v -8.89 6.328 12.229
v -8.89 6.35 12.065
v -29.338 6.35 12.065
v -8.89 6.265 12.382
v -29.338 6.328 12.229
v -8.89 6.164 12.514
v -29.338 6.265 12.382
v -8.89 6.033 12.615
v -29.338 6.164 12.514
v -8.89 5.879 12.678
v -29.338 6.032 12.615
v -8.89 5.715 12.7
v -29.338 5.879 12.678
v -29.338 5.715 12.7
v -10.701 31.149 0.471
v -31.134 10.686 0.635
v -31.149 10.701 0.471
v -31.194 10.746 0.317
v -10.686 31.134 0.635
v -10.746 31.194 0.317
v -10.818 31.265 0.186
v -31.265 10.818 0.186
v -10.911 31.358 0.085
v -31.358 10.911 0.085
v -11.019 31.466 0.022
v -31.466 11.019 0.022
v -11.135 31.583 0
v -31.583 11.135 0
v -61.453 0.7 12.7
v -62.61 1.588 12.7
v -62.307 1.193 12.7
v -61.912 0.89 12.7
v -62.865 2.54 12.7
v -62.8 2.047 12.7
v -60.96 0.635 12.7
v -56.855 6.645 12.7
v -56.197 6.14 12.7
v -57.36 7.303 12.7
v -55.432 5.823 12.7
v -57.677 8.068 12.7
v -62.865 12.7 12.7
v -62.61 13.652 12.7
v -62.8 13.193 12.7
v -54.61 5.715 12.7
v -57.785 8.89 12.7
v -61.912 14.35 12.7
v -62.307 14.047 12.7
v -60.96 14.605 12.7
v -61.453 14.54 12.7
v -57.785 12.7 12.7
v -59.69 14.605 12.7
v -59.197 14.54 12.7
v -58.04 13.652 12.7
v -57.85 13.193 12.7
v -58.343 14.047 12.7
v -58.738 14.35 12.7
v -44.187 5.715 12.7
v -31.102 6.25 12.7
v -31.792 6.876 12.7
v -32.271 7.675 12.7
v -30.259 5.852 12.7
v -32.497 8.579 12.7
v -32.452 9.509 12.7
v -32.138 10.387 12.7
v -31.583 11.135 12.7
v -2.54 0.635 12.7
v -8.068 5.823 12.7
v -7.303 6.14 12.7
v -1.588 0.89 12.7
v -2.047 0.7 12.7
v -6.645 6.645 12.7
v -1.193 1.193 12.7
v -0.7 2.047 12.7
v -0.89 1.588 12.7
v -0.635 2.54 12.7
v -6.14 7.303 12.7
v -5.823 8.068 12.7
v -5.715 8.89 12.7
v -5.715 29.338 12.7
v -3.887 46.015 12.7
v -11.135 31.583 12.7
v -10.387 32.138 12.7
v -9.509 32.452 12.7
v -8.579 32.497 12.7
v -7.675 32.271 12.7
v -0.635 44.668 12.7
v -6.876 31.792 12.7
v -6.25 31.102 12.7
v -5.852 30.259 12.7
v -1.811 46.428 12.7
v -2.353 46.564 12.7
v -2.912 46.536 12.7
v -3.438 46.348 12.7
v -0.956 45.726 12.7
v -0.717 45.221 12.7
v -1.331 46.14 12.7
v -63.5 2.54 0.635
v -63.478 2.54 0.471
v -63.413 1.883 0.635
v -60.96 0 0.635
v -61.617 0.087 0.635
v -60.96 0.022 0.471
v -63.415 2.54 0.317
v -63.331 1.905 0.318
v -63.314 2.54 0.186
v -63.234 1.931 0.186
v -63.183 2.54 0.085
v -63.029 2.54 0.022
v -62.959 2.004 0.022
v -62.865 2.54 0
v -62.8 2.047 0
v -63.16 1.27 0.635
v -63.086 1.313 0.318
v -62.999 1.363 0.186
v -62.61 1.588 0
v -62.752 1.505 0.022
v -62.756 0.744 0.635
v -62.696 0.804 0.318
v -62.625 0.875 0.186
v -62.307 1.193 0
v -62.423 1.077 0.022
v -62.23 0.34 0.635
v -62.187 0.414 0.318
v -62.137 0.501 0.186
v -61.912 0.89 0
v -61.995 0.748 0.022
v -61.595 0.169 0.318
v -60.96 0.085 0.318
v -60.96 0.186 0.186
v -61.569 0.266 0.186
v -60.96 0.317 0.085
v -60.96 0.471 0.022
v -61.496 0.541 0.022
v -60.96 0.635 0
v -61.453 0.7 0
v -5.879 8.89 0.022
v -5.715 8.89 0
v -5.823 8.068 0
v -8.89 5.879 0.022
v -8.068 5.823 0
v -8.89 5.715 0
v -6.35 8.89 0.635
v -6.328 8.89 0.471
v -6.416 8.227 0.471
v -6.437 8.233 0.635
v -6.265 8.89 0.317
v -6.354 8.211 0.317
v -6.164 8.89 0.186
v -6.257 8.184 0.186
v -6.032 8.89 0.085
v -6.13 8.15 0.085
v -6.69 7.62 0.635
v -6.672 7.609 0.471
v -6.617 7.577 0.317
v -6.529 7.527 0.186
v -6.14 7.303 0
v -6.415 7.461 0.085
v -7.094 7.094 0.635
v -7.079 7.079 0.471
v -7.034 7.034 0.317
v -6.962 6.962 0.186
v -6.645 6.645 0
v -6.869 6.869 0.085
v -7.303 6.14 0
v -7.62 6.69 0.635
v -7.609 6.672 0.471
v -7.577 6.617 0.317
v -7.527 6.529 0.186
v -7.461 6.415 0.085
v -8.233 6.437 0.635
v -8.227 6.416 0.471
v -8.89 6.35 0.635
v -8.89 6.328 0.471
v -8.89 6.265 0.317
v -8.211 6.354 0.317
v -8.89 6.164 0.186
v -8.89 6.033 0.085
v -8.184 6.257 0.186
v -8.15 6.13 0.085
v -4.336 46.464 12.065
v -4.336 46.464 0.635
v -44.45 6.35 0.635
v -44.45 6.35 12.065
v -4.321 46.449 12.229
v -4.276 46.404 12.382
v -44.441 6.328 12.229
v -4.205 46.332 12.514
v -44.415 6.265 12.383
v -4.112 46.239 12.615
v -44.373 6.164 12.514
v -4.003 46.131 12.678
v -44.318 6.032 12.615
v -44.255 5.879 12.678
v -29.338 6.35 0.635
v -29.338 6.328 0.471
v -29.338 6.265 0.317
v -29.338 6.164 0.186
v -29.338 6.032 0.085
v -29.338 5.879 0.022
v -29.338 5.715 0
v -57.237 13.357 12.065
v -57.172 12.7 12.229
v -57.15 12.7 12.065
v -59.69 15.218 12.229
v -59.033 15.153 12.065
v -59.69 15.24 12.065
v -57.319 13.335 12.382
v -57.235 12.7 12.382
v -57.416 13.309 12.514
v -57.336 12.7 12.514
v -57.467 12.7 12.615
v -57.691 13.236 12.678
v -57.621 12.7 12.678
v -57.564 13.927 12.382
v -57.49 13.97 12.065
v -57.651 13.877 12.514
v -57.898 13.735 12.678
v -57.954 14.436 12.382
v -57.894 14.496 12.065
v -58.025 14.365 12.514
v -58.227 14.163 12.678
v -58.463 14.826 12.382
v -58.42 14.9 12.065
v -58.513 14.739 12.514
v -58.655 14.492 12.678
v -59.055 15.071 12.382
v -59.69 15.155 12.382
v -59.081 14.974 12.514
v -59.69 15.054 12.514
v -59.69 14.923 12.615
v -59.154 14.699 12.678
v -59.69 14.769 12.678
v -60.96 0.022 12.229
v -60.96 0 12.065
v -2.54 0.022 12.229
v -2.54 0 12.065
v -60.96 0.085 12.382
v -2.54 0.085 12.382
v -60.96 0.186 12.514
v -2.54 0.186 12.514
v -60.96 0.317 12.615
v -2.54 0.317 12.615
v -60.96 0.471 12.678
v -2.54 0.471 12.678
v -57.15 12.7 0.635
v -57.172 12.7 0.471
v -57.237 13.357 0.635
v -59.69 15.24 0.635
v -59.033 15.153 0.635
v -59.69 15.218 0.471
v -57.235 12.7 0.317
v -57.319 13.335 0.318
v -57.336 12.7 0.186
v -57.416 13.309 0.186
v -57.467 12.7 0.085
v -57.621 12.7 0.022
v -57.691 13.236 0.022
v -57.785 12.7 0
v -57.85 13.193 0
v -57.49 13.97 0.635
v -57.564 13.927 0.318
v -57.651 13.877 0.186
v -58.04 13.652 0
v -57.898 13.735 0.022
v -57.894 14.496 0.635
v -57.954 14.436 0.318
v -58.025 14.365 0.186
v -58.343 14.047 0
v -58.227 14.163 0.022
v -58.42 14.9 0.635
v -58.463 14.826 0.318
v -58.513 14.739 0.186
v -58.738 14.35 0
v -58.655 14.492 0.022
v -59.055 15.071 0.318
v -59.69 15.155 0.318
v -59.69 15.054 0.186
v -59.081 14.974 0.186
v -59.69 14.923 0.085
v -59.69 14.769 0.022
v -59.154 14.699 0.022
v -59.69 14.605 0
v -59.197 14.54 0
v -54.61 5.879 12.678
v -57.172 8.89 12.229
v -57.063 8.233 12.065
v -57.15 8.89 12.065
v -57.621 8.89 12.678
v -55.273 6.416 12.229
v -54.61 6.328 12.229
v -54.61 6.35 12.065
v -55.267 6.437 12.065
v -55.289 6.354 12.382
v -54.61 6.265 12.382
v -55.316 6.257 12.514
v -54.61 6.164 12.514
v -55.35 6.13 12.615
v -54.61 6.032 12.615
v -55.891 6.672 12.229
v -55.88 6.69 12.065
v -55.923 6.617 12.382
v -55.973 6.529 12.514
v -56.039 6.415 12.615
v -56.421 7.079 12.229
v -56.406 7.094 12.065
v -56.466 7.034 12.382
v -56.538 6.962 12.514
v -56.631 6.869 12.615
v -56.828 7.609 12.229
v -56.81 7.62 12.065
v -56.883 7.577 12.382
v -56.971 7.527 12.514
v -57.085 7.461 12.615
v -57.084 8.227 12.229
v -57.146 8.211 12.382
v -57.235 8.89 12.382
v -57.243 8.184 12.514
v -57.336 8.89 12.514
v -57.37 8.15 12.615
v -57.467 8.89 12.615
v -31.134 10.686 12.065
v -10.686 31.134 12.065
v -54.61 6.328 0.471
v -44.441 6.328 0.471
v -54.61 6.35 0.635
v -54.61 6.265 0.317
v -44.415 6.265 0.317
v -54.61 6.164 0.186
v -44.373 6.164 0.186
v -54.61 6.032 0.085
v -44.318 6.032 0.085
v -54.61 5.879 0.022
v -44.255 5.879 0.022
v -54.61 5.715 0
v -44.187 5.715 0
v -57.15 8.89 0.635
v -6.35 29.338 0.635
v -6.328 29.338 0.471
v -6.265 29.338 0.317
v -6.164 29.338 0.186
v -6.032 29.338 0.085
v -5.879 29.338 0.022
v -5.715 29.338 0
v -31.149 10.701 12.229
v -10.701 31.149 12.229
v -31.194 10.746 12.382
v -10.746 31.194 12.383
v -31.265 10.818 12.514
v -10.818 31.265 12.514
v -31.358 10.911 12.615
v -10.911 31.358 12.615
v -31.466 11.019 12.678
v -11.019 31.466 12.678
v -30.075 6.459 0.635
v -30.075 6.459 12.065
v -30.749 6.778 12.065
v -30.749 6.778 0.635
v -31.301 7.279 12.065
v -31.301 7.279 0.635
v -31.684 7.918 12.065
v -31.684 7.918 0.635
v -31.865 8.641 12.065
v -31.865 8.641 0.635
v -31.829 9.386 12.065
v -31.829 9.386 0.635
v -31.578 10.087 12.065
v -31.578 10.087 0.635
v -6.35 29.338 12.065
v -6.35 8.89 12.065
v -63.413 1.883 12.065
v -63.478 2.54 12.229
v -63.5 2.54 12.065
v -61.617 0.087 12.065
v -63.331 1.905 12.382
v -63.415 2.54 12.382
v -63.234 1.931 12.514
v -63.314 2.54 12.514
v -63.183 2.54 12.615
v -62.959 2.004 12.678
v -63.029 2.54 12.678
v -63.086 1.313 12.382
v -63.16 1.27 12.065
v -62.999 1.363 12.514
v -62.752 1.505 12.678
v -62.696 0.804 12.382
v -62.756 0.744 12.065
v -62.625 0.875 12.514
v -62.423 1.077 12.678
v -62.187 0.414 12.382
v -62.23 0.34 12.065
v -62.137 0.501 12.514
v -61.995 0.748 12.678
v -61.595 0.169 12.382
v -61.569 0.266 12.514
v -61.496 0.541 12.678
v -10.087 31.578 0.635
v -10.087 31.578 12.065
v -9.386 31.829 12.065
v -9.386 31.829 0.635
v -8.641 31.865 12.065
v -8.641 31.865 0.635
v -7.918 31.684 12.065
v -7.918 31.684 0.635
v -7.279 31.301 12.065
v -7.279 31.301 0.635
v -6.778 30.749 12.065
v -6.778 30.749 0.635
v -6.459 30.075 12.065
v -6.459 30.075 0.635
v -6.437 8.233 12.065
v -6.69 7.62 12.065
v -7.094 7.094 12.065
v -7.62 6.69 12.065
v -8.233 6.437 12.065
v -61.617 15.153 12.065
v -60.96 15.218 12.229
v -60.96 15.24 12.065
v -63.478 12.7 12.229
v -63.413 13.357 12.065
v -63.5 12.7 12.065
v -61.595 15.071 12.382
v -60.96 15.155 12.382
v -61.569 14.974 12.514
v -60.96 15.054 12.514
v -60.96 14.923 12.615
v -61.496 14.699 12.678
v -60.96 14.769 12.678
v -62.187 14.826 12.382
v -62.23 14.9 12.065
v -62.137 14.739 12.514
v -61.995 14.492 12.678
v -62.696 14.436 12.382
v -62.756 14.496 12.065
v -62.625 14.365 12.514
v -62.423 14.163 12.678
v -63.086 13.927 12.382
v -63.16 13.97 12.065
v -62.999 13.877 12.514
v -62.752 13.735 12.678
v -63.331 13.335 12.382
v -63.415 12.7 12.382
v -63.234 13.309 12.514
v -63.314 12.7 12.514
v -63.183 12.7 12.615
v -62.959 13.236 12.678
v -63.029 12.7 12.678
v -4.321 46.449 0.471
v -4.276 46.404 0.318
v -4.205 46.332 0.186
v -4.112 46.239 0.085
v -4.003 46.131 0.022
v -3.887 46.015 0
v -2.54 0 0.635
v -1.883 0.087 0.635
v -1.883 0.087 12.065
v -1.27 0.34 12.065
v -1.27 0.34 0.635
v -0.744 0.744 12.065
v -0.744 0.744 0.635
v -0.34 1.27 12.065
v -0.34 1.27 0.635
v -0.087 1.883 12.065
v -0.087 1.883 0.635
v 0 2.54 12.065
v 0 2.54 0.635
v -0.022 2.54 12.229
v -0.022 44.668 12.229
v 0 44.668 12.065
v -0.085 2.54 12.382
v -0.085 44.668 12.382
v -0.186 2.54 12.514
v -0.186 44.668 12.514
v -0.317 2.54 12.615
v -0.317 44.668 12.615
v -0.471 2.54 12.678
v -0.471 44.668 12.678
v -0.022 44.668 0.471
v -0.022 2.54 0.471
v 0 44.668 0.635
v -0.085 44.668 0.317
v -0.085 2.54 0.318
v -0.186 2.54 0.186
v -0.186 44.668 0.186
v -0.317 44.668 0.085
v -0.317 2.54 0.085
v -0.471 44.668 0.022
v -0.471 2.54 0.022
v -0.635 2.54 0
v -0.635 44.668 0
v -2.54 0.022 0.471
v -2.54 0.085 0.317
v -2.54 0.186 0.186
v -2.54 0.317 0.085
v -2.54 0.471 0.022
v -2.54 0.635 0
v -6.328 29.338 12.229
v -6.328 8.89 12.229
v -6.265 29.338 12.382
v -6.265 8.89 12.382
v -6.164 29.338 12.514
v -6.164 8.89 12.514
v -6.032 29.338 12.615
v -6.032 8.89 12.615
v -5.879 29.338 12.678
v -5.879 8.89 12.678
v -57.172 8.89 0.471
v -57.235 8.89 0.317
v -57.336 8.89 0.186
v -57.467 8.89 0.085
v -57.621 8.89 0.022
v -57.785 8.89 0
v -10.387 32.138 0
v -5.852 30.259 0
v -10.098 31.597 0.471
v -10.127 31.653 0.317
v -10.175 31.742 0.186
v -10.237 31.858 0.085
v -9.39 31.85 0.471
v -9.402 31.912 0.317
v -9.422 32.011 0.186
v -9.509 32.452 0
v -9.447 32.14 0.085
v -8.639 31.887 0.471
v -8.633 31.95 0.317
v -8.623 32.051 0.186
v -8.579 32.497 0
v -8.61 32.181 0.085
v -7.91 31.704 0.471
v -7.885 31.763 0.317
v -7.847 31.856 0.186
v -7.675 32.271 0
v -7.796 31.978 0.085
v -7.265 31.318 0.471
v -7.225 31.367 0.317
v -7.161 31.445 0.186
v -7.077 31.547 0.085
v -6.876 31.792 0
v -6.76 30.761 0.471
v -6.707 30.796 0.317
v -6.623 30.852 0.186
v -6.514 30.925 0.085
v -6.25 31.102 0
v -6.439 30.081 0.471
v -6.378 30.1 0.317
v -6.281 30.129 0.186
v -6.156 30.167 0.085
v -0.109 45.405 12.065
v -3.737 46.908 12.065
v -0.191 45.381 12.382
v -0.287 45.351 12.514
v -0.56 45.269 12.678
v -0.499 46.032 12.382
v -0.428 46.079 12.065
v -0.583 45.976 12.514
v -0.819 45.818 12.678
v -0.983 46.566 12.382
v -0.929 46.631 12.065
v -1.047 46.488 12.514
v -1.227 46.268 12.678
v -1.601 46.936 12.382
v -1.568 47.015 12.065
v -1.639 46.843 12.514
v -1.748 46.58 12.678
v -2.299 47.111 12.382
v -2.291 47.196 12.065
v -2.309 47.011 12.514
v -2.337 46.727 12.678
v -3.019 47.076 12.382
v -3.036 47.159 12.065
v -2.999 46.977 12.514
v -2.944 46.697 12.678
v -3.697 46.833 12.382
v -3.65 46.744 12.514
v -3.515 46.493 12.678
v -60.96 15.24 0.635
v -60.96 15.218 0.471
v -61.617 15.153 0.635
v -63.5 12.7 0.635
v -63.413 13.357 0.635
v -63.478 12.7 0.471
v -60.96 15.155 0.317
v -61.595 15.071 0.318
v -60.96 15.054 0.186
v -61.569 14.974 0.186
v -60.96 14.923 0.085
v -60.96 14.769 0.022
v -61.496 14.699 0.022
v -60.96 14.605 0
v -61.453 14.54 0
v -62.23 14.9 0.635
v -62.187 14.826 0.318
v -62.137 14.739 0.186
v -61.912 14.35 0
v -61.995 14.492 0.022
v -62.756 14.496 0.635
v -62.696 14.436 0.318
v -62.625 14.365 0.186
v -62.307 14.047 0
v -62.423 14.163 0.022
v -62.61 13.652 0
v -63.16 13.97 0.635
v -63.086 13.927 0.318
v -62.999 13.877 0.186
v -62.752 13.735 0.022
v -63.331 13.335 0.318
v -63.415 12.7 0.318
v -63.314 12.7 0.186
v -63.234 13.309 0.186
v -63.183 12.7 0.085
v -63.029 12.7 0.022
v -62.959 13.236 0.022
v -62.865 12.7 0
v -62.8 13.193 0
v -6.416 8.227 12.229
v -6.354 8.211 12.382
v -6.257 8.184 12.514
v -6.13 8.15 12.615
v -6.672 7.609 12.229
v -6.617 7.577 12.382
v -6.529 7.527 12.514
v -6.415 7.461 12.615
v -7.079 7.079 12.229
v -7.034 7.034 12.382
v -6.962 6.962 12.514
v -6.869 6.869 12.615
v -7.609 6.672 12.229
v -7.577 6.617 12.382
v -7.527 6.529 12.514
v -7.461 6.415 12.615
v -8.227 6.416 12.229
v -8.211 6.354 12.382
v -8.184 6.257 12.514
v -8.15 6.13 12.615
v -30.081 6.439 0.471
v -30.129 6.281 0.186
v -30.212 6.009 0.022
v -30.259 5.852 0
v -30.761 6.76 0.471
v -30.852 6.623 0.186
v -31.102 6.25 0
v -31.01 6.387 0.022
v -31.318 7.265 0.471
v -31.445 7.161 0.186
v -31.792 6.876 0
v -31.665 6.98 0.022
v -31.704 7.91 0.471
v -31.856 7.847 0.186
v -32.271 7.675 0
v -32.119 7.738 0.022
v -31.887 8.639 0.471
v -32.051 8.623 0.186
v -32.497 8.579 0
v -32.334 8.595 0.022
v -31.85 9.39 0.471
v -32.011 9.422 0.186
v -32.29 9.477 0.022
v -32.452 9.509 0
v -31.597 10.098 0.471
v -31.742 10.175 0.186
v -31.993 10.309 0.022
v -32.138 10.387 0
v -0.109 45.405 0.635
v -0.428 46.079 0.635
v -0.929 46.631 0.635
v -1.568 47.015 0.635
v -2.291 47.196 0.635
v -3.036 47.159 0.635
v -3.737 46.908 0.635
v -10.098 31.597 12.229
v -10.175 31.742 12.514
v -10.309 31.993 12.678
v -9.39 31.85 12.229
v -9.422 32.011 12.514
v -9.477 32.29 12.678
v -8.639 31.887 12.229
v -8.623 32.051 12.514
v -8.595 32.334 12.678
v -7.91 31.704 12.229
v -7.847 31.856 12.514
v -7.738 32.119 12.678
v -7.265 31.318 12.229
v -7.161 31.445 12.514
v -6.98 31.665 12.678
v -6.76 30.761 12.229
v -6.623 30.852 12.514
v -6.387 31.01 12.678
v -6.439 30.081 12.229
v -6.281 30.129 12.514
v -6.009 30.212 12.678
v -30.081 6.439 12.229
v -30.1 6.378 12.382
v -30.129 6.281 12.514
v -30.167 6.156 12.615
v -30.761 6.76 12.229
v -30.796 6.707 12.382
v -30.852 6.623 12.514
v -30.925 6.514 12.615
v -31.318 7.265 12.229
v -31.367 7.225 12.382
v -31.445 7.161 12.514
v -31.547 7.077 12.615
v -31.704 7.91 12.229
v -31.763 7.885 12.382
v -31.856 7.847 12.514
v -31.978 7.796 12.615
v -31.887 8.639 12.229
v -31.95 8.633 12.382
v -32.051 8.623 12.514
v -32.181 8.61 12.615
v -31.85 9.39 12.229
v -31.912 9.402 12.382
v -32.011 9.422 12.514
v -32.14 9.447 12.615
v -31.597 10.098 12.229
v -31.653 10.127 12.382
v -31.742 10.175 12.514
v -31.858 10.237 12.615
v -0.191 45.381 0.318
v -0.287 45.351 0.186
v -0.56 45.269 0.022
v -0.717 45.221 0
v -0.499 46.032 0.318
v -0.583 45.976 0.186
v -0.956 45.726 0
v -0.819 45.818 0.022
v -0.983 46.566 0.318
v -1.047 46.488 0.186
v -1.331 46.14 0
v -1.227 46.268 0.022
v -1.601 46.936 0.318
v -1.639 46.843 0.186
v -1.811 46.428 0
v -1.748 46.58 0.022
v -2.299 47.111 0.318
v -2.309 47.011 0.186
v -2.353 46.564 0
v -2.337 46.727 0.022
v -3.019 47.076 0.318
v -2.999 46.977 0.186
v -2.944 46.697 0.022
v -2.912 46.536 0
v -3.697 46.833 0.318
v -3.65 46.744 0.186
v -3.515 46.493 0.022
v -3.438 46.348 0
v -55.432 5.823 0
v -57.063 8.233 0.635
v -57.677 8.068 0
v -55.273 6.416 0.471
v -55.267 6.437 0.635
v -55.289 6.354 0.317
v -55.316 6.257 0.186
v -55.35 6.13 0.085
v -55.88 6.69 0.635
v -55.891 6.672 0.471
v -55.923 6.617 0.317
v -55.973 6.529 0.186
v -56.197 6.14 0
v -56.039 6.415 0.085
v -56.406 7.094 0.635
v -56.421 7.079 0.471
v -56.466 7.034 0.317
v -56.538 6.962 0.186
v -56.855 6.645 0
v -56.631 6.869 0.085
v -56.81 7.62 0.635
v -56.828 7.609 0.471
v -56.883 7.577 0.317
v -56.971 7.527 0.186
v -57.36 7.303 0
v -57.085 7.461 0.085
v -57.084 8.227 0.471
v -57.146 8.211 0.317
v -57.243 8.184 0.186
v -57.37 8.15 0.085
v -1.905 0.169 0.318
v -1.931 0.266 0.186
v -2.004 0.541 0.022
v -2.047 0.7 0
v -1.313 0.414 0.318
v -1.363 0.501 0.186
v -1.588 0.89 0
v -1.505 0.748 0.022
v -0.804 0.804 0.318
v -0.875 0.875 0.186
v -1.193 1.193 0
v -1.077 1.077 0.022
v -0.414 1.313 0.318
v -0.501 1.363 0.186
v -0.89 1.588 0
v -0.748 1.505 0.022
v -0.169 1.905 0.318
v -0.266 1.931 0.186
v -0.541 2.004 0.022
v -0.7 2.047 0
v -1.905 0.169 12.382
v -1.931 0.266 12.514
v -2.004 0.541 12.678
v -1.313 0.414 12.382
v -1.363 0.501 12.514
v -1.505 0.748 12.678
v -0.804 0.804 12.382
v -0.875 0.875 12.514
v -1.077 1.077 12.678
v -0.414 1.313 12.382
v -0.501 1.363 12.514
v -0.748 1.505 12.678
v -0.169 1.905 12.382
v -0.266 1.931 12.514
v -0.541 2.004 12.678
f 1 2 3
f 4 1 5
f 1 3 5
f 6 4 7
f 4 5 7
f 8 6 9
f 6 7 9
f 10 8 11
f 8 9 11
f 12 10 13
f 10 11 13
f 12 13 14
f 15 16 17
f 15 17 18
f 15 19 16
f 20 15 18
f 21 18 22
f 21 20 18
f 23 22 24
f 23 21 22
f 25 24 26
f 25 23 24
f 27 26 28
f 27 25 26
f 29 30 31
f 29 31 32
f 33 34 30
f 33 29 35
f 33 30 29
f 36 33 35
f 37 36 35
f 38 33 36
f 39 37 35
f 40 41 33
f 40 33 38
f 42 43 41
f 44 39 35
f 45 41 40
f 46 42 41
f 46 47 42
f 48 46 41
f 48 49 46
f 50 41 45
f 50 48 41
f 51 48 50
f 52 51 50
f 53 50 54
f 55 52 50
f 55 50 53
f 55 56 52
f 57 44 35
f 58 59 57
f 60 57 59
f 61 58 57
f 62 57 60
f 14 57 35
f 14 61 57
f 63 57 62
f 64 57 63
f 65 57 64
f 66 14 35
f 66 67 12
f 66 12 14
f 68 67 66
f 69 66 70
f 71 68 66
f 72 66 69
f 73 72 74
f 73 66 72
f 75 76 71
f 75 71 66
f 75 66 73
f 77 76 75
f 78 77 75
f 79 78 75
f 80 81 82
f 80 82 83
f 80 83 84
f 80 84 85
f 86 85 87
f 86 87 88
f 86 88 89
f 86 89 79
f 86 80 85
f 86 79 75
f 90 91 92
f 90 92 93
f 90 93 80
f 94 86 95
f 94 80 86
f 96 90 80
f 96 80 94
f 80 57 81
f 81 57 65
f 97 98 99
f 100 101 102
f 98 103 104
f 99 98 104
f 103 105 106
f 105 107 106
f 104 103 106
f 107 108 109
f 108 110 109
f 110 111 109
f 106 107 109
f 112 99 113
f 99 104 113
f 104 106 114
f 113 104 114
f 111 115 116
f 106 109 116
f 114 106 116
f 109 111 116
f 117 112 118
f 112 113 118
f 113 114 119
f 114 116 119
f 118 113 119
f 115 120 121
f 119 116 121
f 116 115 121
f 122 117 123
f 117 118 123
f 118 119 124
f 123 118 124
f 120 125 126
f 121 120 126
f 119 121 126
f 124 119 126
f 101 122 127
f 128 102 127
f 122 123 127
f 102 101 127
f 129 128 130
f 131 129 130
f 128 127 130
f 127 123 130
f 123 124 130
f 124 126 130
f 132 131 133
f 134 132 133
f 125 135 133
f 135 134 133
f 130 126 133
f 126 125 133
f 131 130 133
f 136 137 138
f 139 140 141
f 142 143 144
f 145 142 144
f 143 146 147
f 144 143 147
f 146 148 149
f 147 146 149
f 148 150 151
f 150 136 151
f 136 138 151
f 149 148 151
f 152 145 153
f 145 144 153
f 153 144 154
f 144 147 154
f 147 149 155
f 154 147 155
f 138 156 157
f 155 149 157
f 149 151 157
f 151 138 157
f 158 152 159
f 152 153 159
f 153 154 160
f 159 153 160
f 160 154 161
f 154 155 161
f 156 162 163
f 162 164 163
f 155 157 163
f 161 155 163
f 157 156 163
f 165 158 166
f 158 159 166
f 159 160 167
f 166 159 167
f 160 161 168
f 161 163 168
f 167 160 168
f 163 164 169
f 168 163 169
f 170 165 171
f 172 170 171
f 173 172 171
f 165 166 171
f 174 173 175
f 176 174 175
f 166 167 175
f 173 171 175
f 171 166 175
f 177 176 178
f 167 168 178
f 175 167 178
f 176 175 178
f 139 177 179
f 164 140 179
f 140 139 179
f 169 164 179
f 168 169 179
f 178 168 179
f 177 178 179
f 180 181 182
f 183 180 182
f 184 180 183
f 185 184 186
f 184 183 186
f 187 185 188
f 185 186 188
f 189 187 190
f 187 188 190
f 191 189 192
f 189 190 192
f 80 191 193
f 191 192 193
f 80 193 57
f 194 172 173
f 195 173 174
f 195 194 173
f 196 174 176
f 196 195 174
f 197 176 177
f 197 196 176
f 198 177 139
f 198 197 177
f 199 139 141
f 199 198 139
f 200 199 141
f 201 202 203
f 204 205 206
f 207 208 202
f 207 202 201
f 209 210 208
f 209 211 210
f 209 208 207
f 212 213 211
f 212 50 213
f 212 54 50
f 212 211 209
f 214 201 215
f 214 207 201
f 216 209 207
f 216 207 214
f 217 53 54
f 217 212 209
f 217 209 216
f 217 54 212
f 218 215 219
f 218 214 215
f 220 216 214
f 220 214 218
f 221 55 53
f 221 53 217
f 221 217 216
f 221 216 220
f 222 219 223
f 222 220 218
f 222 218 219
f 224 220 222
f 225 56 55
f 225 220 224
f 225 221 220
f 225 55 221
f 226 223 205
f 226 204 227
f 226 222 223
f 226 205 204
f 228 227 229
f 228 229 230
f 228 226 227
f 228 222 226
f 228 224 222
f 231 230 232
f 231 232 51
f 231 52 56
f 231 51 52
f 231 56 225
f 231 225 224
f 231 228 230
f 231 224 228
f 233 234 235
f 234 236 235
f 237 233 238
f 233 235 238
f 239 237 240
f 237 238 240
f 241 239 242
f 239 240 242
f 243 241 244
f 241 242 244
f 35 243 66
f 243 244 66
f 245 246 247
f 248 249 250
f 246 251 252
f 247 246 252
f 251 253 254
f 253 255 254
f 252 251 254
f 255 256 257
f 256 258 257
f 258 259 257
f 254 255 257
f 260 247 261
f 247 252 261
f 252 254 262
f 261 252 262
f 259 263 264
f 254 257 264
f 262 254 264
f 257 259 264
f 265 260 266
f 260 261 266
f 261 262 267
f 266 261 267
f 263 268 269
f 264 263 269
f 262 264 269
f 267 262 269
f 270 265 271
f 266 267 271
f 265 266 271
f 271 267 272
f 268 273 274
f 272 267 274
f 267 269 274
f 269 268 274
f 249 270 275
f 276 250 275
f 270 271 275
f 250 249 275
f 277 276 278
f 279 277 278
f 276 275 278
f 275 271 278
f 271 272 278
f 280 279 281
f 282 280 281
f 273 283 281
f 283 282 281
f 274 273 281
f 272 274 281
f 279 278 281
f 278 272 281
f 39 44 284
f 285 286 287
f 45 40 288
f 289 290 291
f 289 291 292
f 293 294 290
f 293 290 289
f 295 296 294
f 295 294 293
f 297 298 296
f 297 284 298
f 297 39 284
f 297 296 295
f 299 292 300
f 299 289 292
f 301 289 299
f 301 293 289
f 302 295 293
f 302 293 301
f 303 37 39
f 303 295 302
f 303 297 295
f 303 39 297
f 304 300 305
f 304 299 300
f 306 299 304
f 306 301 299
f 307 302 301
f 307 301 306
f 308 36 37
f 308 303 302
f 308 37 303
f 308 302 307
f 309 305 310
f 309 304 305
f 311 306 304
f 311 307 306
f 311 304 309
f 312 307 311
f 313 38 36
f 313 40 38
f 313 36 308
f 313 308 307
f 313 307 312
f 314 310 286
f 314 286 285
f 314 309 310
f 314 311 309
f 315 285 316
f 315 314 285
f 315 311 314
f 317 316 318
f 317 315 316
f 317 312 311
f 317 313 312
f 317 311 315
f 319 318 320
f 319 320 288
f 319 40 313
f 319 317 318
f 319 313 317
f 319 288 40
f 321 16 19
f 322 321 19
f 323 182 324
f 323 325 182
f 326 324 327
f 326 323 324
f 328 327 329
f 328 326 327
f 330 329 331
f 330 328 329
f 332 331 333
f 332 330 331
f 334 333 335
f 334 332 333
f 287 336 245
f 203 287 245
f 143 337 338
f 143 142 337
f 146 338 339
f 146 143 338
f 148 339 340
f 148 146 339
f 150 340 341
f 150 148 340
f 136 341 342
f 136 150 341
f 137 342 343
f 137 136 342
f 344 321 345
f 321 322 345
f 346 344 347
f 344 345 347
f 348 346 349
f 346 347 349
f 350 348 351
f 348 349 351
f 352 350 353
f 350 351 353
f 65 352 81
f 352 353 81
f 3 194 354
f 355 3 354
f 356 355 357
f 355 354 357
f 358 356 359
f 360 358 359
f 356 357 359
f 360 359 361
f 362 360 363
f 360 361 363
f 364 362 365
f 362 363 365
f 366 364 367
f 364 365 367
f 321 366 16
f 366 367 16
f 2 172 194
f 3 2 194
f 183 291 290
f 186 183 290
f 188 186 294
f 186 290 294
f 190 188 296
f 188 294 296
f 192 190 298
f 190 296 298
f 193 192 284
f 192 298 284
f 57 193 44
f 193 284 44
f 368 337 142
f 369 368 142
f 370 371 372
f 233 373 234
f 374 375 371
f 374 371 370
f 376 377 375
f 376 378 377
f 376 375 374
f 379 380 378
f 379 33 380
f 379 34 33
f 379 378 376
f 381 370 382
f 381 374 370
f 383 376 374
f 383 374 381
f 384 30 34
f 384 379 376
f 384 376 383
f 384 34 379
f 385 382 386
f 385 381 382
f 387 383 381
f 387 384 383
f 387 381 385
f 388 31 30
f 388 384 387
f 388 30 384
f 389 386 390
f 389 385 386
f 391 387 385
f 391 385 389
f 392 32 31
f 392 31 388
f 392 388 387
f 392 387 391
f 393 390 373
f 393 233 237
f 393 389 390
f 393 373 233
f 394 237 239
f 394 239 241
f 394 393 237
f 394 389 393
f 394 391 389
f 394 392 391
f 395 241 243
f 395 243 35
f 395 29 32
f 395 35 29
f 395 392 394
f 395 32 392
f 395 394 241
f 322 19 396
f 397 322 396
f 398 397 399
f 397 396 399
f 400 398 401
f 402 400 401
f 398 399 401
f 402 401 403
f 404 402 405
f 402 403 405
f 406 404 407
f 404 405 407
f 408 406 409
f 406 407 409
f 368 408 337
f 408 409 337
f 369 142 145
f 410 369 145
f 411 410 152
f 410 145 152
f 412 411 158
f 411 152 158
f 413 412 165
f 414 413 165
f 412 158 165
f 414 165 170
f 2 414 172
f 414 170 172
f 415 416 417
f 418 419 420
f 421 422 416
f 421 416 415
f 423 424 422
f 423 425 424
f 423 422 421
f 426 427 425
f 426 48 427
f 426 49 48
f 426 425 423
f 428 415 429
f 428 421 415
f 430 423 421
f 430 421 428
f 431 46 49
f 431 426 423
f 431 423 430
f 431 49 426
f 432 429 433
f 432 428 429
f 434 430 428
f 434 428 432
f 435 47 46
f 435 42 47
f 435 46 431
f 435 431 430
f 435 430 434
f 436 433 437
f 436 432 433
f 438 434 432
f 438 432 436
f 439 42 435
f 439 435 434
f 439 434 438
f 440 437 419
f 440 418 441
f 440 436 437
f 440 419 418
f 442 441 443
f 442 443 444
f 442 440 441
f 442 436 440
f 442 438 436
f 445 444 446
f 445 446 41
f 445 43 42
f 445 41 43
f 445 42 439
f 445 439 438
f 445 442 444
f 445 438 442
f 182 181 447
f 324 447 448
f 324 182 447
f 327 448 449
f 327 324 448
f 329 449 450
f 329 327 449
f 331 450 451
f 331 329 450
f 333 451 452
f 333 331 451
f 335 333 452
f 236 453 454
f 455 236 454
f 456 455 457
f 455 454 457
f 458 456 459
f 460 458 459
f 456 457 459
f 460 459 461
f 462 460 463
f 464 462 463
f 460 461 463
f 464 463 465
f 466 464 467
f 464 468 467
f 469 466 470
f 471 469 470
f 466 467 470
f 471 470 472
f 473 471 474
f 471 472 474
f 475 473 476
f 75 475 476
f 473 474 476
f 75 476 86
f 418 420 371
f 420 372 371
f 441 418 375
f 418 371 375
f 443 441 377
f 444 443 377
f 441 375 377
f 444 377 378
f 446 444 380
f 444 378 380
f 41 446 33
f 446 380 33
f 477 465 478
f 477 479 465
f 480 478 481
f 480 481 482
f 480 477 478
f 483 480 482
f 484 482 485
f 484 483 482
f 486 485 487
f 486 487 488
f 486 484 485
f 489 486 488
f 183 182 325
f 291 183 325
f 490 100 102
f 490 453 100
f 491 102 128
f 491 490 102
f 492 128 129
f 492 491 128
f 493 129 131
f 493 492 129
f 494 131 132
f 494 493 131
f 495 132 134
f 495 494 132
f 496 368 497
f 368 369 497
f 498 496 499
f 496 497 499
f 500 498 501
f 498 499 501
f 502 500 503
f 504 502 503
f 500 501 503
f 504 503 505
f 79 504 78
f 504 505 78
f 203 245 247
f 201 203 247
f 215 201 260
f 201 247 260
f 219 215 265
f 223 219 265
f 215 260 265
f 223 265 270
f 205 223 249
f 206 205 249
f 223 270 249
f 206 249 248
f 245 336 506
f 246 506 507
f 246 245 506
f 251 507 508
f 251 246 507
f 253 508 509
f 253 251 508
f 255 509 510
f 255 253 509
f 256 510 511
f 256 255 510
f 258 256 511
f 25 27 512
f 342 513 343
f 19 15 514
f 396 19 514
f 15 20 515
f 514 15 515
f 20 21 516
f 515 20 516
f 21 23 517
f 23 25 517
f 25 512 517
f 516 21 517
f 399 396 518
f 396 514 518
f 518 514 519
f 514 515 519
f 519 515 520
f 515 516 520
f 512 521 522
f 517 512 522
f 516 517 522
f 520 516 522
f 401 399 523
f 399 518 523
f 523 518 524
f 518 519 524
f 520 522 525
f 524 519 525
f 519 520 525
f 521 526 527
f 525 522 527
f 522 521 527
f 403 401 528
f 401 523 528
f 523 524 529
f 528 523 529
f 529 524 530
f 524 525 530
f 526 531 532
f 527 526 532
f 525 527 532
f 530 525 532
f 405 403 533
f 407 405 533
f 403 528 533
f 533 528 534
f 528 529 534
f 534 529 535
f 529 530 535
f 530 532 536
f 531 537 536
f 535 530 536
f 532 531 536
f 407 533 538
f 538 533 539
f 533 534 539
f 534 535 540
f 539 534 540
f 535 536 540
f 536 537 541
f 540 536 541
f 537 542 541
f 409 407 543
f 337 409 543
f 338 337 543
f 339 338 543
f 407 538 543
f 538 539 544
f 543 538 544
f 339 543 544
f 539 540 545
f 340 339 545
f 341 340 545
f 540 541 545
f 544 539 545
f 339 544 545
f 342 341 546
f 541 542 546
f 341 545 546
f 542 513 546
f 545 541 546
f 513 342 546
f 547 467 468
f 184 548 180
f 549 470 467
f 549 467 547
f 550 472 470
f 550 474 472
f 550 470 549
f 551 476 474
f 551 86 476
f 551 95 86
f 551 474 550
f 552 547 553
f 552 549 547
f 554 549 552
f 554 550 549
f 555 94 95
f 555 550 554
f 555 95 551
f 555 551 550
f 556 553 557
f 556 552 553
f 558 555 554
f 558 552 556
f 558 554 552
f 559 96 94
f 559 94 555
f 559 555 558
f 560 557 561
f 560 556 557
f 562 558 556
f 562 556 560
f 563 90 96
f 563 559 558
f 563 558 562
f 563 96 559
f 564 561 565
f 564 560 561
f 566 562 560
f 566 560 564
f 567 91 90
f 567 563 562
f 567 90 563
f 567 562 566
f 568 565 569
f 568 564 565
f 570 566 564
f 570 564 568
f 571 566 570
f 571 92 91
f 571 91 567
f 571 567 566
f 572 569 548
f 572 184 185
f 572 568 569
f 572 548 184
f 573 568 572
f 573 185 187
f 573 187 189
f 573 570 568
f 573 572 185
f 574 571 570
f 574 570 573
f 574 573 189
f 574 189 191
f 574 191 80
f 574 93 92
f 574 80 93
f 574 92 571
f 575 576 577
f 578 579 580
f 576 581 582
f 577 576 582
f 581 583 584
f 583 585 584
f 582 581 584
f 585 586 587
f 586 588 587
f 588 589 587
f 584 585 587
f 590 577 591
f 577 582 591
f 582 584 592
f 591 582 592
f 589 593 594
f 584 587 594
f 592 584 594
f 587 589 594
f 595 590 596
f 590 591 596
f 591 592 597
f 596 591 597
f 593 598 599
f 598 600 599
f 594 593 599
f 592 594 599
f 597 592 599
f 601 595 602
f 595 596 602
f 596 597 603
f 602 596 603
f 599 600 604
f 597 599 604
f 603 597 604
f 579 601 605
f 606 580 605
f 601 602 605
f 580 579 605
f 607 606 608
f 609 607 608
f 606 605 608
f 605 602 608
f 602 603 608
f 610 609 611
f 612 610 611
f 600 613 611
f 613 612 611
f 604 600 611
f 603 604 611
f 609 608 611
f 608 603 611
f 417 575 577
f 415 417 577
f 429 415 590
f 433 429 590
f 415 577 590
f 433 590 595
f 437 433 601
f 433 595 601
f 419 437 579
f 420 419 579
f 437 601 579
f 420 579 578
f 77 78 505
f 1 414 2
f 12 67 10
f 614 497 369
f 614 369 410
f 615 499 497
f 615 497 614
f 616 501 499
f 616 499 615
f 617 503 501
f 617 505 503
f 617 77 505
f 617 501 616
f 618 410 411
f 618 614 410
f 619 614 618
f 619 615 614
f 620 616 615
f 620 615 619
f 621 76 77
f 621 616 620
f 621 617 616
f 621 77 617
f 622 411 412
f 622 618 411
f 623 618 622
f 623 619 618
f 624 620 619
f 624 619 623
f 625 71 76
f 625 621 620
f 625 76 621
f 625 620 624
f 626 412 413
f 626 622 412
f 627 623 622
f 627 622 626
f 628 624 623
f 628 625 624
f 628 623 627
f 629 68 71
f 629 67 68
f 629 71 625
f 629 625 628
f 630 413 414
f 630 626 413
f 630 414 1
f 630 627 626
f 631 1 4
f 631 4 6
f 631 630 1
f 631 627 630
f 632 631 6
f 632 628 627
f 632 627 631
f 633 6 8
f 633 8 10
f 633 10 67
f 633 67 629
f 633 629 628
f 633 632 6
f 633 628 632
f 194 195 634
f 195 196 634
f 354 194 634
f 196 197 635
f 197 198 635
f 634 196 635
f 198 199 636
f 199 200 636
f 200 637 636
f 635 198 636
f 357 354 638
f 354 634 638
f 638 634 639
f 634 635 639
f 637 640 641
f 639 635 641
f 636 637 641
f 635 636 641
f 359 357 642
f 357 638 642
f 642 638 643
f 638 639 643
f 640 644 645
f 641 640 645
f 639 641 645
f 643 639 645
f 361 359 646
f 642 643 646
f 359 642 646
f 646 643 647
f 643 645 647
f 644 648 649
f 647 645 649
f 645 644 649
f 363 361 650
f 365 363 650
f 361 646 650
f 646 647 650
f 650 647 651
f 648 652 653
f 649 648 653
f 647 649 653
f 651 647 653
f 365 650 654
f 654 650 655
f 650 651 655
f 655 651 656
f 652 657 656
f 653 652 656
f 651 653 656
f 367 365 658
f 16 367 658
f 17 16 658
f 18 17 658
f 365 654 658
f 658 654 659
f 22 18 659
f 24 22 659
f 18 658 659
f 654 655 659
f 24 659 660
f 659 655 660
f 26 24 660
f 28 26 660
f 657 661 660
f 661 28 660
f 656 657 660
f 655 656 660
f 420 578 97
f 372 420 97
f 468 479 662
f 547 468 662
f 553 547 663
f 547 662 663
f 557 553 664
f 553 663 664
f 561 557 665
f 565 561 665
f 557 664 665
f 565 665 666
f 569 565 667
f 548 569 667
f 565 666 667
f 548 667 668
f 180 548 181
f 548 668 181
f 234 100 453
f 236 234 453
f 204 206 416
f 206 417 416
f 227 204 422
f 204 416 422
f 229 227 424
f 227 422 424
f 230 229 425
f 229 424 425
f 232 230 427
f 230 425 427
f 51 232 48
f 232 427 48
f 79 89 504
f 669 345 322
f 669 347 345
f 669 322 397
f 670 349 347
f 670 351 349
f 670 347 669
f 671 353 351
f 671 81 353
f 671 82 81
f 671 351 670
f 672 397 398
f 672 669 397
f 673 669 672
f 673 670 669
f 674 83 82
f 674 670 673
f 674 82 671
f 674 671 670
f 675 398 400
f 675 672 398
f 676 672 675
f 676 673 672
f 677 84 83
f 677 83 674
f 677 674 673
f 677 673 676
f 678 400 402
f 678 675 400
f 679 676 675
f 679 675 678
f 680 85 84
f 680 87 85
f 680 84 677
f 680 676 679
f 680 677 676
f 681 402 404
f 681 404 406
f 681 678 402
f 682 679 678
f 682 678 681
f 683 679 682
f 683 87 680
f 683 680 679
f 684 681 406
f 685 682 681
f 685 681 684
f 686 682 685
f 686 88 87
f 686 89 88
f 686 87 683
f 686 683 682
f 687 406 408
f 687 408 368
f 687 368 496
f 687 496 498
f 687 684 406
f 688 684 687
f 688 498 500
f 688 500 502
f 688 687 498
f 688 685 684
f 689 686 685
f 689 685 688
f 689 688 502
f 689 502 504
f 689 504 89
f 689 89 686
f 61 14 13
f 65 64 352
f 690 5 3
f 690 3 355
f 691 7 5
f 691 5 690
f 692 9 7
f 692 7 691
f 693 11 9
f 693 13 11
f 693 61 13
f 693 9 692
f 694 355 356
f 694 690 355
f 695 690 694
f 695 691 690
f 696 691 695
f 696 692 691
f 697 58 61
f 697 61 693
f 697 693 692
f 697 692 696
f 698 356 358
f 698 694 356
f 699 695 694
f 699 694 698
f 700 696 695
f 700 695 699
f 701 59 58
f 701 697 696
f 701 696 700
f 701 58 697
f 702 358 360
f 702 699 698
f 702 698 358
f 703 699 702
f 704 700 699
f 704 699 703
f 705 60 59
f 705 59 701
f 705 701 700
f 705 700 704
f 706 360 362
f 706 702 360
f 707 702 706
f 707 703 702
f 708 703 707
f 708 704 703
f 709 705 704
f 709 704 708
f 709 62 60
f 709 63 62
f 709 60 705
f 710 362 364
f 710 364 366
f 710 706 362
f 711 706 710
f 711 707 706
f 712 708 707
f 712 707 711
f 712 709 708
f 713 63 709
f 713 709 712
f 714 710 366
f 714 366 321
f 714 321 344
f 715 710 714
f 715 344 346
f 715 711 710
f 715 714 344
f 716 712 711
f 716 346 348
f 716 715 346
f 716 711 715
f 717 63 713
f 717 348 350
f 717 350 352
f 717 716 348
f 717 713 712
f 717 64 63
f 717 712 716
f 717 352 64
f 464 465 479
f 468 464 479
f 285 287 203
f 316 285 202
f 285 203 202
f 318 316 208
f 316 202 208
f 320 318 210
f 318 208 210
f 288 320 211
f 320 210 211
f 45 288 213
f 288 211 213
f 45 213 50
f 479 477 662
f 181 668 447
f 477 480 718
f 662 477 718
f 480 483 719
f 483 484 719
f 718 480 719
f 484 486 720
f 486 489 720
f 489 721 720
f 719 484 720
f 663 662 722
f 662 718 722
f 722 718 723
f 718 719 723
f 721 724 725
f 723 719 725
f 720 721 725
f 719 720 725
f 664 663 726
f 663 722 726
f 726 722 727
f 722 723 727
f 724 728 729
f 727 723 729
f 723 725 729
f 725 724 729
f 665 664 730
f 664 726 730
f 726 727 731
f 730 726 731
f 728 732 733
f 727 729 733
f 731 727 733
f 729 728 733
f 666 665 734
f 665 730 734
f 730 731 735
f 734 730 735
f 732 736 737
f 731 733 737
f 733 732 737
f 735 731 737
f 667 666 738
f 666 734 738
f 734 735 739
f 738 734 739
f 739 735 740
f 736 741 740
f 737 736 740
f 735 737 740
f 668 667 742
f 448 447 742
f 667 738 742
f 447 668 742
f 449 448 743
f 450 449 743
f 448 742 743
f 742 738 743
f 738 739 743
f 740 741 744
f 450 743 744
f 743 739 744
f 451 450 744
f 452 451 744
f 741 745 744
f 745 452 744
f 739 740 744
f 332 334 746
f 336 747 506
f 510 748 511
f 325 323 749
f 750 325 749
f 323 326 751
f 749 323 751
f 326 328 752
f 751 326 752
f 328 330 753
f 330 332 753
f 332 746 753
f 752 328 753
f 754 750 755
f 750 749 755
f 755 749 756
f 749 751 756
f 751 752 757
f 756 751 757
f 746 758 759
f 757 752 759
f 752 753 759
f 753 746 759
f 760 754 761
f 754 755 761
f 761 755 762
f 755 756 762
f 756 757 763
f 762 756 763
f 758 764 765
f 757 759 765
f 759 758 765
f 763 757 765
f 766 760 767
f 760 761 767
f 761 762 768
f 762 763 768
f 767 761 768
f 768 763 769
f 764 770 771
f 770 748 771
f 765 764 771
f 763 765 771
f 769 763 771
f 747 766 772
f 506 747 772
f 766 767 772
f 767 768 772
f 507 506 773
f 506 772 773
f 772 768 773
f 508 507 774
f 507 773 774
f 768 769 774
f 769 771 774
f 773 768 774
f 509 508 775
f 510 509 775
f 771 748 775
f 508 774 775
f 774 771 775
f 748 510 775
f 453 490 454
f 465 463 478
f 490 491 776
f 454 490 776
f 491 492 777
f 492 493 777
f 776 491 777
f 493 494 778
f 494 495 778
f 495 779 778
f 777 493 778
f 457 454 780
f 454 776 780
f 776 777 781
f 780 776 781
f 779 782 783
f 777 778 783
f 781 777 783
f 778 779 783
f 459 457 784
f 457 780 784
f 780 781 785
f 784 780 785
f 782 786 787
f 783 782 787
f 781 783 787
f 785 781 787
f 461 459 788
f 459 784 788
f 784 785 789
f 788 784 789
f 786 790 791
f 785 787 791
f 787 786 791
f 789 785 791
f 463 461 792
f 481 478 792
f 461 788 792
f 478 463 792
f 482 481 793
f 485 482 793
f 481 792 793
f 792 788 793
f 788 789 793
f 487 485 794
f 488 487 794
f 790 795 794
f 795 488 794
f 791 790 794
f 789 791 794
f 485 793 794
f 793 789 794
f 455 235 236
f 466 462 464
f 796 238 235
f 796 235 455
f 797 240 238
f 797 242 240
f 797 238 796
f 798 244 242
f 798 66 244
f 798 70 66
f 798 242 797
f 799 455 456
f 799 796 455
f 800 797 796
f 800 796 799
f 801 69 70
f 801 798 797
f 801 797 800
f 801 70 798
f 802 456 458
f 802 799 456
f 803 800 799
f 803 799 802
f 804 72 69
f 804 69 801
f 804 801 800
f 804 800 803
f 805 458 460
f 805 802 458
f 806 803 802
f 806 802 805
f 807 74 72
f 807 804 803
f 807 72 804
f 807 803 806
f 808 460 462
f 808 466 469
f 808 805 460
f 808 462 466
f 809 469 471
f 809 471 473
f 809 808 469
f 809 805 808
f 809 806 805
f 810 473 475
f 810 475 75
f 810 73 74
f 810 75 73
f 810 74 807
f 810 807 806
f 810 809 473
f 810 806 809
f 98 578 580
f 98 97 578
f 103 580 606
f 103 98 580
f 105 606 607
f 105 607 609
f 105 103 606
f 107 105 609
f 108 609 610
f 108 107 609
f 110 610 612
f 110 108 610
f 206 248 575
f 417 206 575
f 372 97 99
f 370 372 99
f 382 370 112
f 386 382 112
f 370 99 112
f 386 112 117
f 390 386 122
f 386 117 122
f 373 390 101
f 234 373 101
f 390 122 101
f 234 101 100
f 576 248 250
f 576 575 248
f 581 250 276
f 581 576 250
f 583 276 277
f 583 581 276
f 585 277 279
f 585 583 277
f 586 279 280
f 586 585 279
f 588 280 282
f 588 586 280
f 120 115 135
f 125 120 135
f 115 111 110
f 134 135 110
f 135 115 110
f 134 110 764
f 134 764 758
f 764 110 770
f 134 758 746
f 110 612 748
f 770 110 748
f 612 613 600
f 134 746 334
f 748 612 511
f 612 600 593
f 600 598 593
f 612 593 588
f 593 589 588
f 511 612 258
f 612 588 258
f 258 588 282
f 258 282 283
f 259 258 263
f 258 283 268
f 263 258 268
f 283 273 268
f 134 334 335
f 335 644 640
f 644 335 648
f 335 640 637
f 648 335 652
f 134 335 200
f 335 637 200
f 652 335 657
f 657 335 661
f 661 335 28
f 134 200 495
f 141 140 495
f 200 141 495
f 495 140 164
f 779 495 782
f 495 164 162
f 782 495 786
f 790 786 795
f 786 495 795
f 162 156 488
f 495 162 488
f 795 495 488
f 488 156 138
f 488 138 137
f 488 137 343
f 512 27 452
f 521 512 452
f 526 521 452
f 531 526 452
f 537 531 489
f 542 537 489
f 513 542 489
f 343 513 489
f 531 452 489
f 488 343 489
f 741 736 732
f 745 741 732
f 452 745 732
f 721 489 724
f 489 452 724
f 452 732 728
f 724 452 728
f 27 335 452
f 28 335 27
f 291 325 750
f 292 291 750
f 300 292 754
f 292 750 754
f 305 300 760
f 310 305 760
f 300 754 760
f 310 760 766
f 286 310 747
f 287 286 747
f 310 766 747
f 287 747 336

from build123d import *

# Parameters (mm, degrees)
F1_DEPTH = 12.7
F2_R     = 0.635


with BuildPart() as f1:
    # F0 (on Top) → F1 (new body)
    with BuildSketch(Plane.XY):
        with BuildLine():
            Line((-60.96, 0), (-2.54, 0))
            ThreePointArc((-2.54, 0), (-0.743949, 0.743949), (0, 2.54))
            Line((0, 2.54), (0, 6.35))
            Line((0, 6.35), (0, 44.667898))
            ThreePointArc((0, 44.667898), (-1.567984, 47.014552), (-4.336051, 46.463949))
            Line((-4.336051, 46.463949), (-44.45, 6.35))
            Line((-44.45, 6.35), (-54.61, 6.35))
            ThreePointArc((-54.61, 6.35), (-56.406051, 7.093949), (-57.15, 8.89))
            Line((-57.15, 8.89), (-57.15, 12.7))
            ThreePointArc((-57.15, 12.7), (-57.893949, 14.496051), (-59.69, 15.24))
            Line((-59.69, 15.24), (-60.96, 15.24))
            ThreePointArc((-60.96, 15.24), (-62.756051, 14.496051), (-63.5, 12.7))
            Line((-63.5, 12.7), (-63.5, 6.35))
            Line((-63.5, 6.35), (-63.5, 2.54))
            ThreePointArc((-63.5, 2.54), (-62.756051, 0.743949), (-60.96, 0))
        make_face()
        with BuildLine():
            Line((-31.133693, 10.686051), (-10.686051, 31.133693))
            ThreePointArc((-10.686051, 31.133693), (-7.917984, 31.684295), (-6.35, 29.337641))
            Line((-6.35, 29.337641), (-6.35, 8.89))
            ThreePointArc((-6.35, 8.89), (-7.093949, 7.093949), (-8.89, 6.35))
            Line((-8.89, 6.35), (-29.337641, 6.35))
            ThreePointArc((-29.337641, 6.35), (-31.684295, 7.917984), (-31.133693, 10.686051))
        make_face(mode=Mode.SUBTRACT)
    extrude(amount=F1_DEPTH)

    # F2
    f2_edges = [f1.edges().sort_by_distance(p)[0] for p in [
        (-24.393026, 26.406974, 12.7),
        (-6.35, 19.113821, 12.7),
        (-24.393026, 26.406974, 0),
        (-20.909872, 20.909872, 0),
    ]]
    fillet(f2_edges, radius=F2_R)


solid = f1.part
